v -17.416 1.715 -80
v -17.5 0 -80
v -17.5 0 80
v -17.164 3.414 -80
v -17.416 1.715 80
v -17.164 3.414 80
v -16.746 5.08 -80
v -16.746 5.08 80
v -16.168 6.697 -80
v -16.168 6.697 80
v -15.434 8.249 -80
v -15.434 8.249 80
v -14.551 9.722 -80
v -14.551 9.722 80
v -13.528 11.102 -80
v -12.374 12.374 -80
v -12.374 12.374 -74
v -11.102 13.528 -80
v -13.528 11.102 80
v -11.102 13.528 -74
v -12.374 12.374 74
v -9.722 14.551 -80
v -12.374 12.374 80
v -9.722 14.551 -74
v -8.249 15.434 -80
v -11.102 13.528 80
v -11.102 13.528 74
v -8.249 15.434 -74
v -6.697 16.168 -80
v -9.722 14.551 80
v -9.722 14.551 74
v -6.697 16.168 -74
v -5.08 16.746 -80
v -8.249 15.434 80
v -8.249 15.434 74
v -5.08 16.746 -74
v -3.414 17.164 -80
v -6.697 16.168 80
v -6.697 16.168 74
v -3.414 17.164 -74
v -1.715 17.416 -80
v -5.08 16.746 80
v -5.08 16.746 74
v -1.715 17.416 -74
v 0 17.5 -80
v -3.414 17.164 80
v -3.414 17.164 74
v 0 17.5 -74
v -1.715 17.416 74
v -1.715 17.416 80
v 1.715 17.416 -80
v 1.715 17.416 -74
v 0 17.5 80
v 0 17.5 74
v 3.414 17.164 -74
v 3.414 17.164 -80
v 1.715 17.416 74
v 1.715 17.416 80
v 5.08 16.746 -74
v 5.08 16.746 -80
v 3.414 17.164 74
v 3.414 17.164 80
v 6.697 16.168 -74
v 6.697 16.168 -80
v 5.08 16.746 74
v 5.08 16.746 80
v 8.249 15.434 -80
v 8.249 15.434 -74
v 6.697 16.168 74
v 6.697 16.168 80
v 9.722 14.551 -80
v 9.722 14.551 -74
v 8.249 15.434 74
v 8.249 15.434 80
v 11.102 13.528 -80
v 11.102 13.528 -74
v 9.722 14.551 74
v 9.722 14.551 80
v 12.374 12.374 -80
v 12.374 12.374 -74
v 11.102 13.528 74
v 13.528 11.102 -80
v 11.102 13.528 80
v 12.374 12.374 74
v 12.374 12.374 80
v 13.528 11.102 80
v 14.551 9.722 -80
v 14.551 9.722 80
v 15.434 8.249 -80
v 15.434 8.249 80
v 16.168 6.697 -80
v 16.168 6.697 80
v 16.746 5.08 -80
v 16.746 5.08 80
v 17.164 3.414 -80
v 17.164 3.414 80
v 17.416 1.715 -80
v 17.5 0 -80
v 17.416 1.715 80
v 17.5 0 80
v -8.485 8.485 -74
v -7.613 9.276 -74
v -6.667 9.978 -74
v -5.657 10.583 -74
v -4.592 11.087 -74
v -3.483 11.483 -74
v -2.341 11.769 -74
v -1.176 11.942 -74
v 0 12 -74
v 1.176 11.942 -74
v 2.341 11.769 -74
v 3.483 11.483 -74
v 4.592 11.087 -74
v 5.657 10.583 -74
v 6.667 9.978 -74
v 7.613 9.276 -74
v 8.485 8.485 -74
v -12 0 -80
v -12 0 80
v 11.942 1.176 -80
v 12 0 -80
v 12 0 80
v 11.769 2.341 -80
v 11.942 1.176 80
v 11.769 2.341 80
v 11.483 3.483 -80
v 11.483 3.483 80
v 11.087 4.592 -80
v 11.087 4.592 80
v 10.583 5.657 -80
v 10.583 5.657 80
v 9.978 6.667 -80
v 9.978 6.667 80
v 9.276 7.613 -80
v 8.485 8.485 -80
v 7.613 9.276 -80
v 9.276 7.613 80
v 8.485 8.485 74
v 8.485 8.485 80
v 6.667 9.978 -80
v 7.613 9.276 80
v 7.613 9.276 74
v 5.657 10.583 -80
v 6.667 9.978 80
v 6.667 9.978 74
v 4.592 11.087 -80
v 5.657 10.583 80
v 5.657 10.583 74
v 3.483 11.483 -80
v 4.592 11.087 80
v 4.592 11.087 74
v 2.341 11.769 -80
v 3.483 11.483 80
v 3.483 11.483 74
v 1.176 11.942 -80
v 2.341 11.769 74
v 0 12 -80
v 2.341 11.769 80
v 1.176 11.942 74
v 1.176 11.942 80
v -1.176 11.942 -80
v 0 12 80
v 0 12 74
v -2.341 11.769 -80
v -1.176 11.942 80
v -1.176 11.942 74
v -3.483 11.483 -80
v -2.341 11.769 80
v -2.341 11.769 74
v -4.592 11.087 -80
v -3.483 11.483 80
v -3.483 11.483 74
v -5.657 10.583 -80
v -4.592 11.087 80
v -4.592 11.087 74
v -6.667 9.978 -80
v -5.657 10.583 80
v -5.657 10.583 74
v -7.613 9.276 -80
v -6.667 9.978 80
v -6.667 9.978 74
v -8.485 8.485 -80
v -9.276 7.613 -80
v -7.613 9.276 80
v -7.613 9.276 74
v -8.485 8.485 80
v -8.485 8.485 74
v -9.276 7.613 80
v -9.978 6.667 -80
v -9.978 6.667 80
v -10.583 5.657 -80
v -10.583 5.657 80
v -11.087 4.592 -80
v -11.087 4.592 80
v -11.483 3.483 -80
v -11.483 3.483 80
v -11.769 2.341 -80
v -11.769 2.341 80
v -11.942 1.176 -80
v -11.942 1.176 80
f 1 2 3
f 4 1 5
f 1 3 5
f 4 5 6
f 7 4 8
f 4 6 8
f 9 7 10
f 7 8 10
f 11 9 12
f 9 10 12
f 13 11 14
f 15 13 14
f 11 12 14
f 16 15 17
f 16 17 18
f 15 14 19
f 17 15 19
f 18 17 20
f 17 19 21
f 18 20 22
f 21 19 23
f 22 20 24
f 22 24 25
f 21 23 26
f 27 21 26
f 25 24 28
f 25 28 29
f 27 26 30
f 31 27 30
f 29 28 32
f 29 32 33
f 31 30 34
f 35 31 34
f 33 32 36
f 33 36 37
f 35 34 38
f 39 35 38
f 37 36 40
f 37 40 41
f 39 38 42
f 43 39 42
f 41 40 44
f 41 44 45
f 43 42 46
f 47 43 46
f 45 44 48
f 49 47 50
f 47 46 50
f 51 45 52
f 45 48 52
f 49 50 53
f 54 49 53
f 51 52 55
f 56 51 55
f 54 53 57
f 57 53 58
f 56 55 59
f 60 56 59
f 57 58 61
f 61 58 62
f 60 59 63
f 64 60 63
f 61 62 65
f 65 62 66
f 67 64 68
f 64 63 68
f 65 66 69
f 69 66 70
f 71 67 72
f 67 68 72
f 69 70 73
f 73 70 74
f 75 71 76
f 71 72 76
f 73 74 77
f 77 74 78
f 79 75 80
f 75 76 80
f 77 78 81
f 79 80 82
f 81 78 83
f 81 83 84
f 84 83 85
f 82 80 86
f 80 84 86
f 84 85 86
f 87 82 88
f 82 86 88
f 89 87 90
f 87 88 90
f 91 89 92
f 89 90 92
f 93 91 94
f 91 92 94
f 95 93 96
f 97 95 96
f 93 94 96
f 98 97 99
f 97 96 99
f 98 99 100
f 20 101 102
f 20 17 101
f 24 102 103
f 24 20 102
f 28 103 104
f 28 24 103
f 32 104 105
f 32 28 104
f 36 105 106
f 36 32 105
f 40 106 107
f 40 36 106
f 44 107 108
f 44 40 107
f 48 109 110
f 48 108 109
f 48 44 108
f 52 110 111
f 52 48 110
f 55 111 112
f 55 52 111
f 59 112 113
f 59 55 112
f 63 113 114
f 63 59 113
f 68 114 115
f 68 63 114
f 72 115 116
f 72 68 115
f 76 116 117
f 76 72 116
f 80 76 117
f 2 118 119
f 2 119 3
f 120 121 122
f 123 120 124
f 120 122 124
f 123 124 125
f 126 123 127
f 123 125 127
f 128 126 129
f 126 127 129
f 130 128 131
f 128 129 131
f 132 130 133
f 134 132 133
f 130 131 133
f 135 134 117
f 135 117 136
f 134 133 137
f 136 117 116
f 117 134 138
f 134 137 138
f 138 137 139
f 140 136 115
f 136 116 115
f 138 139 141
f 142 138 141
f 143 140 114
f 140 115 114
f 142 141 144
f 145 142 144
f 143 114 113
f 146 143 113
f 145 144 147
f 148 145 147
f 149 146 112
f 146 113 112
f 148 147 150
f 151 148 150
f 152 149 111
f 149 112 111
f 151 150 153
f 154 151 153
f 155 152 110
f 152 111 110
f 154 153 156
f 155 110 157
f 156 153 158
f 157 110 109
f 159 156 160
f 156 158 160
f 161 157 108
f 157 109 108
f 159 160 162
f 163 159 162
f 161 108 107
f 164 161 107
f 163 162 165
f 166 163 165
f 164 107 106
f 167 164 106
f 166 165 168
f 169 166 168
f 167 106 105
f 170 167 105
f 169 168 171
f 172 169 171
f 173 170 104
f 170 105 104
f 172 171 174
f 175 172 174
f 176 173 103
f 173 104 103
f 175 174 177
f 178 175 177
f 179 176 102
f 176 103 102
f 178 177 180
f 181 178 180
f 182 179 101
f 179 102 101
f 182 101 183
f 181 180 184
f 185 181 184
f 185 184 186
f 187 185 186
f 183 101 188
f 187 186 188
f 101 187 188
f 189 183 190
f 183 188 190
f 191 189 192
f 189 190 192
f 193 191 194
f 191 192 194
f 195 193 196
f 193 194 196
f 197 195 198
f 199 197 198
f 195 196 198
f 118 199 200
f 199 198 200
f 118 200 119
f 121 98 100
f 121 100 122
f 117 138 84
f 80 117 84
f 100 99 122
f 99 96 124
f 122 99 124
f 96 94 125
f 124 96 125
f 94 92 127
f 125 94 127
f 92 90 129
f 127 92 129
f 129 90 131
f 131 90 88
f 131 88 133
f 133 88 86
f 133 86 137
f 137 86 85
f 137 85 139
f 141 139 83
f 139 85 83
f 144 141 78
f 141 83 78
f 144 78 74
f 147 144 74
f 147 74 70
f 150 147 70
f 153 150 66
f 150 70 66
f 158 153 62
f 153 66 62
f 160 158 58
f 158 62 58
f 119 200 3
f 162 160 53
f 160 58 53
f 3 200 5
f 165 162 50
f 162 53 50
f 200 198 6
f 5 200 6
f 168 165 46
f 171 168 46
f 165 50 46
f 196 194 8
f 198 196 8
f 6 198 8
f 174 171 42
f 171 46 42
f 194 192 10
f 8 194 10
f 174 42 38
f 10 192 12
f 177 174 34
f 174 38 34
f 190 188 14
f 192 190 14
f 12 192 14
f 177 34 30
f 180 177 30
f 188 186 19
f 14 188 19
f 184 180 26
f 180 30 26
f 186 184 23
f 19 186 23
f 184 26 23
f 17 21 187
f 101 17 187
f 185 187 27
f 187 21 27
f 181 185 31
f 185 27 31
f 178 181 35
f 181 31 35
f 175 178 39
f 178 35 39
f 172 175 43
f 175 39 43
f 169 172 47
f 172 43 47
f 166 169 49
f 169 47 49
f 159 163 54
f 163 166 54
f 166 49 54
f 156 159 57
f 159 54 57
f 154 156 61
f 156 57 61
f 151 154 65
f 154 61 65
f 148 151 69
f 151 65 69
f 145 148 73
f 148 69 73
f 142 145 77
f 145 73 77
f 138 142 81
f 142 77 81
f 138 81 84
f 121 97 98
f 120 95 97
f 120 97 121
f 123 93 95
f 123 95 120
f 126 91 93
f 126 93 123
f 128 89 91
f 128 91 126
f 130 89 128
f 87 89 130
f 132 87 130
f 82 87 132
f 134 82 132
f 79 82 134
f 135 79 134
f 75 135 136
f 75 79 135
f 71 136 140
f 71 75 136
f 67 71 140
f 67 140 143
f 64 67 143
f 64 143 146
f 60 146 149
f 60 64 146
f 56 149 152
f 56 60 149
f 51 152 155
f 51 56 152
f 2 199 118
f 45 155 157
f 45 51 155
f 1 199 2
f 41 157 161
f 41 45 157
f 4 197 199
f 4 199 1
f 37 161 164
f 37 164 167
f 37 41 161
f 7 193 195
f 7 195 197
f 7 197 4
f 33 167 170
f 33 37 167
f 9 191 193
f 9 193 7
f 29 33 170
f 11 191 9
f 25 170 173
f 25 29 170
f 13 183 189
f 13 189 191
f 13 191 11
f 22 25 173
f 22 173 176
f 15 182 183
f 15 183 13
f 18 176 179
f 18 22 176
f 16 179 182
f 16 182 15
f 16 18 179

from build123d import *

# Parameters (mm, degrees)
BOSS_EXTRUDE1_DEPTH = 80
CUT_EXTRUDE3_DEPTH  = 74


with BuildPart() as part:
    # Sketch1 → Boss-Extrude1 (new, symmetric)
    with BuildSketch(Plane.XY):
        with BuildLine():
            Line((17.5, 0), (12, 0))
            ThreePointArc((12, 0), (0, 12), (-12, 0))
            Line((-12, 0), (-17.5, 0))
            ThreePointArc((-17.5, 0), (0, 17.5), (17.5, 0))
        make_face()
    extrude(amount=BOSS_EXTRUDE1_DEPTH, both=True)

    # Sketch4 → Cut-Extrude3 (cut, symmetric)
    with BuildSketch(Plane.XY):
        with BuildLine():
            Line((0, 0), (12.374368671, 12.374368671))
            ThreePointArc((12.374368671, 12.374368671), (0, 17.5), (-12.374368671, 12.374368671))
            Line((-12.374368671, 12.374368671), (0, 0))
        make_face()
    extrude(amount=CUT_EXTRUDE3_DEPTH, both=True, mode=Mode.SUBTRACT)


solid = part.part
